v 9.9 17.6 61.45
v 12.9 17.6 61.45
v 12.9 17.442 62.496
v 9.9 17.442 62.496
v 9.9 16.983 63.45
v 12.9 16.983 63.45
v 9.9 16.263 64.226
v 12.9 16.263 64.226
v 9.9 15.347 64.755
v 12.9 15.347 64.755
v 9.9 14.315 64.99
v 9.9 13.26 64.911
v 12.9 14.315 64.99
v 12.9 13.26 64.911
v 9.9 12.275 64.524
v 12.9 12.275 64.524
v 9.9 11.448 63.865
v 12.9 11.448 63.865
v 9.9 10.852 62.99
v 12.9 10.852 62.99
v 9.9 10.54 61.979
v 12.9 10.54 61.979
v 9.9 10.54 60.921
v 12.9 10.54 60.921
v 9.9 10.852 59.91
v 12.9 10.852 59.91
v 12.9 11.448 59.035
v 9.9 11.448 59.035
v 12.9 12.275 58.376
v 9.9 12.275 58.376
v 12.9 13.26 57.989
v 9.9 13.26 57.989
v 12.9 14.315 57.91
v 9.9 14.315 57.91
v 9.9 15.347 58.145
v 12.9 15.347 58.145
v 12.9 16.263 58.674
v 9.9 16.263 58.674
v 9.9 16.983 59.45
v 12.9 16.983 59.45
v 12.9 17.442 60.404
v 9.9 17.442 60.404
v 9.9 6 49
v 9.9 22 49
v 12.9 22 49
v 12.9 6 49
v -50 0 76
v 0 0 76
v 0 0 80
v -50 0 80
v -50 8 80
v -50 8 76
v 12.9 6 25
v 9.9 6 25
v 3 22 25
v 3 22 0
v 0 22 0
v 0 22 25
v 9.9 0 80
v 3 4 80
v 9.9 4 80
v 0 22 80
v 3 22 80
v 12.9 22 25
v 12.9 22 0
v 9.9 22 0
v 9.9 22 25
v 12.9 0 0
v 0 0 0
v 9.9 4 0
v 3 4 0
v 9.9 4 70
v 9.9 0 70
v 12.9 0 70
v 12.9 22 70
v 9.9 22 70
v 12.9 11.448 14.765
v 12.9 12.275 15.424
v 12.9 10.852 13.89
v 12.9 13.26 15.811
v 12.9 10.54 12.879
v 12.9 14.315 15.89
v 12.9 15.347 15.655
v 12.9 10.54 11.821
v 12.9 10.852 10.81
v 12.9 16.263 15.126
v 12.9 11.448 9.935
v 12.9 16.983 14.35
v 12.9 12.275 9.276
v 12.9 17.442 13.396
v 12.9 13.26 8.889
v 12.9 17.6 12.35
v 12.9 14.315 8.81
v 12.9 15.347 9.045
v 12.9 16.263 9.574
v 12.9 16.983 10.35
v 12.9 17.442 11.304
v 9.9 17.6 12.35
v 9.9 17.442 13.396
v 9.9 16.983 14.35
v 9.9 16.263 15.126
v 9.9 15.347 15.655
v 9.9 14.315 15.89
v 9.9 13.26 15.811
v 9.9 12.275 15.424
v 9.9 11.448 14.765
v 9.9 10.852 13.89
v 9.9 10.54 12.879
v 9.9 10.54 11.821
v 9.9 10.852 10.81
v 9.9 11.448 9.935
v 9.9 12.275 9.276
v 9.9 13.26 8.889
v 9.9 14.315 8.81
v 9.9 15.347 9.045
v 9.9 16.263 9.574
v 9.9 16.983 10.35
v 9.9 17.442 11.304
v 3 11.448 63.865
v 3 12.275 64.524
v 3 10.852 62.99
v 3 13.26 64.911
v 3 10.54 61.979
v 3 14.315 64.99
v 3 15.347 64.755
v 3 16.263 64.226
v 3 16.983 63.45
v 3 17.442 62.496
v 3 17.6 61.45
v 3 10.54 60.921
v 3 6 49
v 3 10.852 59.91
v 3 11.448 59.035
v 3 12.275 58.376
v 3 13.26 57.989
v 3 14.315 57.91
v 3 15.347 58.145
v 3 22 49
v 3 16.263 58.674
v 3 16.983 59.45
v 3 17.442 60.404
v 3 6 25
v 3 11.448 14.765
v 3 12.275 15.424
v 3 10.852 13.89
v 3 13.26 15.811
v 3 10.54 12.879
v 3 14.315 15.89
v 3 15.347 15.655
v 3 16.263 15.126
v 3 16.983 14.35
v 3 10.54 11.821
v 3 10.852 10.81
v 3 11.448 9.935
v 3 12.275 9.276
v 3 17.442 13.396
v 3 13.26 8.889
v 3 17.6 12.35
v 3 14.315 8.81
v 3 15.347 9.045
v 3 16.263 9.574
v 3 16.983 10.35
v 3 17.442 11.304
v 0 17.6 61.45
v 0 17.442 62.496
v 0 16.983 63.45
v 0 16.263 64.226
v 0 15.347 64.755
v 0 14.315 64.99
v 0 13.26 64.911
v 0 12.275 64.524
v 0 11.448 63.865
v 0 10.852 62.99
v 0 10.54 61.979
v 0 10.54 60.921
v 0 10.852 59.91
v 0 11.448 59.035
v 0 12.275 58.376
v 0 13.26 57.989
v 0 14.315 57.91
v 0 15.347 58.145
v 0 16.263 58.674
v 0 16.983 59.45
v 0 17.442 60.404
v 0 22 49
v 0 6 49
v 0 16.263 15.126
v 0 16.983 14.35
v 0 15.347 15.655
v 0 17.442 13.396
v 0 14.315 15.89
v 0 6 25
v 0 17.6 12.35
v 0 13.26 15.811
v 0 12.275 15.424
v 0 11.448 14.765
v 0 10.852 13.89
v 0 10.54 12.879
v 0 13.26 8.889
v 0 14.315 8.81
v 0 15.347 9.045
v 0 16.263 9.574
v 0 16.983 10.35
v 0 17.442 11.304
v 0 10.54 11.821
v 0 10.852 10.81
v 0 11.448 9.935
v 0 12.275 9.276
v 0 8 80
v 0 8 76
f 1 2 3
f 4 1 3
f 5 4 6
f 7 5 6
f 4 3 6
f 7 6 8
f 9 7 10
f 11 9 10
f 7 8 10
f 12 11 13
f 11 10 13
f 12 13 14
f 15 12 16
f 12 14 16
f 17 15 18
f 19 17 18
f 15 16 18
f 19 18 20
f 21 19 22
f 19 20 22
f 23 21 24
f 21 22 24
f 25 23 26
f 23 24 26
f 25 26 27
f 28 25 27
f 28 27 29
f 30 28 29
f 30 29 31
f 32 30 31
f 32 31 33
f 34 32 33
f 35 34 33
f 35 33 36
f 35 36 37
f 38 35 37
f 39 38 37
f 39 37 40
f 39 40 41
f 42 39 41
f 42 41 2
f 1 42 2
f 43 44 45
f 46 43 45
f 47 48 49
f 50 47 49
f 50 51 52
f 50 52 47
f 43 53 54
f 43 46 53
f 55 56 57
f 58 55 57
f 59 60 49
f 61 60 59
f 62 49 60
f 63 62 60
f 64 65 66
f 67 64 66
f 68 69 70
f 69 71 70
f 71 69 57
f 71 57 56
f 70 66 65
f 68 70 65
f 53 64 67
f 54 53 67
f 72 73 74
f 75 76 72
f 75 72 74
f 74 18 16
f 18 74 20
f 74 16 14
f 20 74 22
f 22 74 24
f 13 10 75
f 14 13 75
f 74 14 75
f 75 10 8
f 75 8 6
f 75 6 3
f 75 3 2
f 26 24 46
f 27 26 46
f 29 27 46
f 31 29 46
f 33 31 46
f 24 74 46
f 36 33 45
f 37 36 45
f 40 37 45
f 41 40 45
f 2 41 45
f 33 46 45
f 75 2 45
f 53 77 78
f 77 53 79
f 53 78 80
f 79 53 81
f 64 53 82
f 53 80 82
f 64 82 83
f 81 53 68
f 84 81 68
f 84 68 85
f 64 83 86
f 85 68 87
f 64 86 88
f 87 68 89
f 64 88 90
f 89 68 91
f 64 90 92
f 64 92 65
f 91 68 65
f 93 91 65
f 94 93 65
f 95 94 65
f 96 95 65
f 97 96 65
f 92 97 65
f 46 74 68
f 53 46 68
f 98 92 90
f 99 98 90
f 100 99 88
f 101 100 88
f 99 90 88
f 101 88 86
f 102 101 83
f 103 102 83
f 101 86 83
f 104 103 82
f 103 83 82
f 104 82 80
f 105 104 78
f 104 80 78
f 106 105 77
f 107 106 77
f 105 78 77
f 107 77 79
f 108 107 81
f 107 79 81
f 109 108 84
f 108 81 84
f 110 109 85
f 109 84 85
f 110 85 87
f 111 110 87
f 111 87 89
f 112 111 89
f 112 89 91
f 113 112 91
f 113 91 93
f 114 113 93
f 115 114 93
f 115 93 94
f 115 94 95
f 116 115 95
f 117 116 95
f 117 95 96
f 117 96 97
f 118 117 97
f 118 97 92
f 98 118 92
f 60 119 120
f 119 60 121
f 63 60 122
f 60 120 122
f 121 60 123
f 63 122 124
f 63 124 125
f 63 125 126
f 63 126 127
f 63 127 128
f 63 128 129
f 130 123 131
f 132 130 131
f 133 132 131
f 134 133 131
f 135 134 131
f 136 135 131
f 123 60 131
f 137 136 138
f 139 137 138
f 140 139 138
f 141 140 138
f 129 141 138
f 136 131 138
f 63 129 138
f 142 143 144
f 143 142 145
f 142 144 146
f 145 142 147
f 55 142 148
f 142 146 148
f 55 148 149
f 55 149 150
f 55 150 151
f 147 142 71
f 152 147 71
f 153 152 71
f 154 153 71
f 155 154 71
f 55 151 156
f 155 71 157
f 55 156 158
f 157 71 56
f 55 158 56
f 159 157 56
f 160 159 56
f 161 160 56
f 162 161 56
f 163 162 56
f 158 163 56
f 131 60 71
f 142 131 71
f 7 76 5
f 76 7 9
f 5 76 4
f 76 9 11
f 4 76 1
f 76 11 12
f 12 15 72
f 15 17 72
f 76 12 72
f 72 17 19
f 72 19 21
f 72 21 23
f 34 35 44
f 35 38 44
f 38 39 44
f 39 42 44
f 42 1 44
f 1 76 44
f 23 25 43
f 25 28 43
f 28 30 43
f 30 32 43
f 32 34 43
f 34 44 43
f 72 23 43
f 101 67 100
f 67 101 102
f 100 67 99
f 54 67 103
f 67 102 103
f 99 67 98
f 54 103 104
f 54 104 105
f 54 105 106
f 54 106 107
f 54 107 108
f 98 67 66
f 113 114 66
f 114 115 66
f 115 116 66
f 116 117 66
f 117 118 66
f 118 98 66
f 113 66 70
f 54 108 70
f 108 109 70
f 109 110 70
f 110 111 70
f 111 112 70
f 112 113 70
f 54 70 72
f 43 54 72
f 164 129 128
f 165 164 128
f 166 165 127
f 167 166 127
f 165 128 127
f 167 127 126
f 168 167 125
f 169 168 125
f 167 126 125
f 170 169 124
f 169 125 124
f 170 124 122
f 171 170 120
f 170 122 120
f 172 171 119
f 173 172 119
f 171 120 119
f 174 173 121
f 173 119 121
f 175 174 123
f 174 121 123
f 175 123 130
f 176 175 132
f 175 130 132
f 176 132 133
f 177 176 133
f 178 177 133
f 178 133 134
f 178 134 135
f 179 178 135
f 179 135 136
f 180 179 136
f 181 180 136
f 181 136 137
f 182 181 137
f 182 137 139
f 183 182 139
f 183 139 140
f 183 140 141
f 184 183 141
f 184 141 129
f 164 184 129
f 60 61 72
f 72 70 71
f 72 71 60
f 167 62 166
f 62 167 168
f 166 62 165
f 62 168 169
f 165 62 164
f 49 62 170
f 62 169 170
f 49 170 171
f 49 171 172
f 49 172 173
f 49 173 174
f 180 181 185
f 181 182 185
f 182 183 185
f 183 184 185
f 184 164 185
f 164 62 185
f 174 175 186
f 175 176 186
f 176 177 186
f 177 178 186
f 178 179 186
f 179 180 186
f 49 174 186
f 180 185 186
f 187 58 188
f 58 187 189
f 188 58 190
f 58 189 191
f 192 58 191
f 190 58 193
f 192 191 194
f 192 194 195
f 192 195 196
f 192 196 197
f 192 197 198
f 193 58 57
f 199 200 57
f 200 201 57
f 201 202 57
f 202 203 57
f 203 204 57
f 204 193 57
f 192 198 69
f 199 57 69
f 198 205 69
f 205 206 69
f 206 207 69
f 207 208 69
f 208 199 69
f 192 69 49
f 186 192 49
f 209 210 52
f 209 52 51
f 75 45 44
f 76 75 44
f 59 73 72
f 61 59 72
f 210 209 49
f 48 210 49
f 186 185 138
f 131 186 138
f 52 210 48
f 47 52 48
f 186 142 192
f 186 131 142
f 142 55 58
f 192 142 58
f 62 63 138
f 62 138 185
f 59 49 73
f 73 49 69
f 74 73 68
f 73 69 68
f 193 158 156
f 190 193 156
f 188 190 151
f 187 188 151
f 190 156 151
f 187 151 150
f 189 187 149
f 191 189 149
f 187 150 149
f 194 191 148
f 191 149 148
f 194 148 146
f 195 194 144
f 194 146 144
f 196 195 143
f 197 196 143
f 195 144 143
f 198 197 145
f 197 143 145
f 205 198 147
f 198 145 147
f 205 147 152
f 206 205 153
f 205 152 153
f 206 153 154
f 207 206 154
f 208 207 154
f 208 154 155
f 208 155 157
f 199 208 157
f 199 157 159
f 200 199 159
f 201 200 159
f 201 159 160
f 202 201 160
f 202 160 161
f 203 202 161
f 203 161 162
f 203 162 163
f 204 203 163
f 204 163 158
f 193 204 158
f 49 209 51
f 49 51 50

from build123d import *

# Parameters (mm, degrees)
F1_DEPTH = 70
F2_R     = 3.55
F3_DEPTH = 12.901
F5_DEPTH = 10
F6_W     = 8
F6_H     = 4
F7_DEPTH = 50
F8_W     = 9.9
F8_H     = 24
F8_W_2   = 3
F9_DEPTH = 16


# Not quite as in the source:
# - a feature names something its author has since deleted; it is built from what else it names


with BuildPart() as f1:
    # F0 (on Top) → F1 (new body)
    with BuildSketch(Plane.XY):
        Polygon((0, 22), (0, 0), (12.9, 0), (12.9, 22), (9.9, 22), (9.9, 4), (3, 4), (3, 22), align=None)
    extrude(amount=F1_DEPTH)

    # F2 (on face) → F3 (cut, through all)
    with BuildSketch(Plane.YZ.offset(12.9)):
        with Locations((14.05, 61.45)):
            Circle(F2_R)
        with Locations((14.05, 12.35)):
            Circle(F2_R)
    extrude(amount=-F3_DEPTH, mode=Mode.SUBTRACT)

    # F4 (on face) → F5 (join)
    with BuildSketch(Plane.XY.offset(70)):
        Polygon((9.9, 0), (9.9, 4), (3, 4), (3, 22), (0, 22), (0, 0), align=None)
    extrude(amount=F5_DEPTH)

    # F8 (on face) → F9 (cut)
    with BuildSketch(Plane(origin=(0, 22, 0), x_dir=(-1, 0, 0), z_dir=(0, 1, 0))):
        with Locations((-4.95, 37)):
            Rectangle(F8_W, F8_H)
        with Locations((-11.4, 37)):
            Rectangle(F8_W_2, F8_H)
    extrude(amount=-F9_DEPTH, mode=Mode.SUBTRACT)


with BuildPart() as f7:
    # F6 (on face) → F7 (new body)
    with BuildSketch(Plane(origin=(0, 0, 0), x_dir=(0, -1, 0), z_dir=(-1, 0, 0))):
        with Locations((-4, 78)):
            Rectangle(F6_W, F6_H)
    extrude(amount=F7_DEPTH)


solid = Compound([f1.part, f7.part])
